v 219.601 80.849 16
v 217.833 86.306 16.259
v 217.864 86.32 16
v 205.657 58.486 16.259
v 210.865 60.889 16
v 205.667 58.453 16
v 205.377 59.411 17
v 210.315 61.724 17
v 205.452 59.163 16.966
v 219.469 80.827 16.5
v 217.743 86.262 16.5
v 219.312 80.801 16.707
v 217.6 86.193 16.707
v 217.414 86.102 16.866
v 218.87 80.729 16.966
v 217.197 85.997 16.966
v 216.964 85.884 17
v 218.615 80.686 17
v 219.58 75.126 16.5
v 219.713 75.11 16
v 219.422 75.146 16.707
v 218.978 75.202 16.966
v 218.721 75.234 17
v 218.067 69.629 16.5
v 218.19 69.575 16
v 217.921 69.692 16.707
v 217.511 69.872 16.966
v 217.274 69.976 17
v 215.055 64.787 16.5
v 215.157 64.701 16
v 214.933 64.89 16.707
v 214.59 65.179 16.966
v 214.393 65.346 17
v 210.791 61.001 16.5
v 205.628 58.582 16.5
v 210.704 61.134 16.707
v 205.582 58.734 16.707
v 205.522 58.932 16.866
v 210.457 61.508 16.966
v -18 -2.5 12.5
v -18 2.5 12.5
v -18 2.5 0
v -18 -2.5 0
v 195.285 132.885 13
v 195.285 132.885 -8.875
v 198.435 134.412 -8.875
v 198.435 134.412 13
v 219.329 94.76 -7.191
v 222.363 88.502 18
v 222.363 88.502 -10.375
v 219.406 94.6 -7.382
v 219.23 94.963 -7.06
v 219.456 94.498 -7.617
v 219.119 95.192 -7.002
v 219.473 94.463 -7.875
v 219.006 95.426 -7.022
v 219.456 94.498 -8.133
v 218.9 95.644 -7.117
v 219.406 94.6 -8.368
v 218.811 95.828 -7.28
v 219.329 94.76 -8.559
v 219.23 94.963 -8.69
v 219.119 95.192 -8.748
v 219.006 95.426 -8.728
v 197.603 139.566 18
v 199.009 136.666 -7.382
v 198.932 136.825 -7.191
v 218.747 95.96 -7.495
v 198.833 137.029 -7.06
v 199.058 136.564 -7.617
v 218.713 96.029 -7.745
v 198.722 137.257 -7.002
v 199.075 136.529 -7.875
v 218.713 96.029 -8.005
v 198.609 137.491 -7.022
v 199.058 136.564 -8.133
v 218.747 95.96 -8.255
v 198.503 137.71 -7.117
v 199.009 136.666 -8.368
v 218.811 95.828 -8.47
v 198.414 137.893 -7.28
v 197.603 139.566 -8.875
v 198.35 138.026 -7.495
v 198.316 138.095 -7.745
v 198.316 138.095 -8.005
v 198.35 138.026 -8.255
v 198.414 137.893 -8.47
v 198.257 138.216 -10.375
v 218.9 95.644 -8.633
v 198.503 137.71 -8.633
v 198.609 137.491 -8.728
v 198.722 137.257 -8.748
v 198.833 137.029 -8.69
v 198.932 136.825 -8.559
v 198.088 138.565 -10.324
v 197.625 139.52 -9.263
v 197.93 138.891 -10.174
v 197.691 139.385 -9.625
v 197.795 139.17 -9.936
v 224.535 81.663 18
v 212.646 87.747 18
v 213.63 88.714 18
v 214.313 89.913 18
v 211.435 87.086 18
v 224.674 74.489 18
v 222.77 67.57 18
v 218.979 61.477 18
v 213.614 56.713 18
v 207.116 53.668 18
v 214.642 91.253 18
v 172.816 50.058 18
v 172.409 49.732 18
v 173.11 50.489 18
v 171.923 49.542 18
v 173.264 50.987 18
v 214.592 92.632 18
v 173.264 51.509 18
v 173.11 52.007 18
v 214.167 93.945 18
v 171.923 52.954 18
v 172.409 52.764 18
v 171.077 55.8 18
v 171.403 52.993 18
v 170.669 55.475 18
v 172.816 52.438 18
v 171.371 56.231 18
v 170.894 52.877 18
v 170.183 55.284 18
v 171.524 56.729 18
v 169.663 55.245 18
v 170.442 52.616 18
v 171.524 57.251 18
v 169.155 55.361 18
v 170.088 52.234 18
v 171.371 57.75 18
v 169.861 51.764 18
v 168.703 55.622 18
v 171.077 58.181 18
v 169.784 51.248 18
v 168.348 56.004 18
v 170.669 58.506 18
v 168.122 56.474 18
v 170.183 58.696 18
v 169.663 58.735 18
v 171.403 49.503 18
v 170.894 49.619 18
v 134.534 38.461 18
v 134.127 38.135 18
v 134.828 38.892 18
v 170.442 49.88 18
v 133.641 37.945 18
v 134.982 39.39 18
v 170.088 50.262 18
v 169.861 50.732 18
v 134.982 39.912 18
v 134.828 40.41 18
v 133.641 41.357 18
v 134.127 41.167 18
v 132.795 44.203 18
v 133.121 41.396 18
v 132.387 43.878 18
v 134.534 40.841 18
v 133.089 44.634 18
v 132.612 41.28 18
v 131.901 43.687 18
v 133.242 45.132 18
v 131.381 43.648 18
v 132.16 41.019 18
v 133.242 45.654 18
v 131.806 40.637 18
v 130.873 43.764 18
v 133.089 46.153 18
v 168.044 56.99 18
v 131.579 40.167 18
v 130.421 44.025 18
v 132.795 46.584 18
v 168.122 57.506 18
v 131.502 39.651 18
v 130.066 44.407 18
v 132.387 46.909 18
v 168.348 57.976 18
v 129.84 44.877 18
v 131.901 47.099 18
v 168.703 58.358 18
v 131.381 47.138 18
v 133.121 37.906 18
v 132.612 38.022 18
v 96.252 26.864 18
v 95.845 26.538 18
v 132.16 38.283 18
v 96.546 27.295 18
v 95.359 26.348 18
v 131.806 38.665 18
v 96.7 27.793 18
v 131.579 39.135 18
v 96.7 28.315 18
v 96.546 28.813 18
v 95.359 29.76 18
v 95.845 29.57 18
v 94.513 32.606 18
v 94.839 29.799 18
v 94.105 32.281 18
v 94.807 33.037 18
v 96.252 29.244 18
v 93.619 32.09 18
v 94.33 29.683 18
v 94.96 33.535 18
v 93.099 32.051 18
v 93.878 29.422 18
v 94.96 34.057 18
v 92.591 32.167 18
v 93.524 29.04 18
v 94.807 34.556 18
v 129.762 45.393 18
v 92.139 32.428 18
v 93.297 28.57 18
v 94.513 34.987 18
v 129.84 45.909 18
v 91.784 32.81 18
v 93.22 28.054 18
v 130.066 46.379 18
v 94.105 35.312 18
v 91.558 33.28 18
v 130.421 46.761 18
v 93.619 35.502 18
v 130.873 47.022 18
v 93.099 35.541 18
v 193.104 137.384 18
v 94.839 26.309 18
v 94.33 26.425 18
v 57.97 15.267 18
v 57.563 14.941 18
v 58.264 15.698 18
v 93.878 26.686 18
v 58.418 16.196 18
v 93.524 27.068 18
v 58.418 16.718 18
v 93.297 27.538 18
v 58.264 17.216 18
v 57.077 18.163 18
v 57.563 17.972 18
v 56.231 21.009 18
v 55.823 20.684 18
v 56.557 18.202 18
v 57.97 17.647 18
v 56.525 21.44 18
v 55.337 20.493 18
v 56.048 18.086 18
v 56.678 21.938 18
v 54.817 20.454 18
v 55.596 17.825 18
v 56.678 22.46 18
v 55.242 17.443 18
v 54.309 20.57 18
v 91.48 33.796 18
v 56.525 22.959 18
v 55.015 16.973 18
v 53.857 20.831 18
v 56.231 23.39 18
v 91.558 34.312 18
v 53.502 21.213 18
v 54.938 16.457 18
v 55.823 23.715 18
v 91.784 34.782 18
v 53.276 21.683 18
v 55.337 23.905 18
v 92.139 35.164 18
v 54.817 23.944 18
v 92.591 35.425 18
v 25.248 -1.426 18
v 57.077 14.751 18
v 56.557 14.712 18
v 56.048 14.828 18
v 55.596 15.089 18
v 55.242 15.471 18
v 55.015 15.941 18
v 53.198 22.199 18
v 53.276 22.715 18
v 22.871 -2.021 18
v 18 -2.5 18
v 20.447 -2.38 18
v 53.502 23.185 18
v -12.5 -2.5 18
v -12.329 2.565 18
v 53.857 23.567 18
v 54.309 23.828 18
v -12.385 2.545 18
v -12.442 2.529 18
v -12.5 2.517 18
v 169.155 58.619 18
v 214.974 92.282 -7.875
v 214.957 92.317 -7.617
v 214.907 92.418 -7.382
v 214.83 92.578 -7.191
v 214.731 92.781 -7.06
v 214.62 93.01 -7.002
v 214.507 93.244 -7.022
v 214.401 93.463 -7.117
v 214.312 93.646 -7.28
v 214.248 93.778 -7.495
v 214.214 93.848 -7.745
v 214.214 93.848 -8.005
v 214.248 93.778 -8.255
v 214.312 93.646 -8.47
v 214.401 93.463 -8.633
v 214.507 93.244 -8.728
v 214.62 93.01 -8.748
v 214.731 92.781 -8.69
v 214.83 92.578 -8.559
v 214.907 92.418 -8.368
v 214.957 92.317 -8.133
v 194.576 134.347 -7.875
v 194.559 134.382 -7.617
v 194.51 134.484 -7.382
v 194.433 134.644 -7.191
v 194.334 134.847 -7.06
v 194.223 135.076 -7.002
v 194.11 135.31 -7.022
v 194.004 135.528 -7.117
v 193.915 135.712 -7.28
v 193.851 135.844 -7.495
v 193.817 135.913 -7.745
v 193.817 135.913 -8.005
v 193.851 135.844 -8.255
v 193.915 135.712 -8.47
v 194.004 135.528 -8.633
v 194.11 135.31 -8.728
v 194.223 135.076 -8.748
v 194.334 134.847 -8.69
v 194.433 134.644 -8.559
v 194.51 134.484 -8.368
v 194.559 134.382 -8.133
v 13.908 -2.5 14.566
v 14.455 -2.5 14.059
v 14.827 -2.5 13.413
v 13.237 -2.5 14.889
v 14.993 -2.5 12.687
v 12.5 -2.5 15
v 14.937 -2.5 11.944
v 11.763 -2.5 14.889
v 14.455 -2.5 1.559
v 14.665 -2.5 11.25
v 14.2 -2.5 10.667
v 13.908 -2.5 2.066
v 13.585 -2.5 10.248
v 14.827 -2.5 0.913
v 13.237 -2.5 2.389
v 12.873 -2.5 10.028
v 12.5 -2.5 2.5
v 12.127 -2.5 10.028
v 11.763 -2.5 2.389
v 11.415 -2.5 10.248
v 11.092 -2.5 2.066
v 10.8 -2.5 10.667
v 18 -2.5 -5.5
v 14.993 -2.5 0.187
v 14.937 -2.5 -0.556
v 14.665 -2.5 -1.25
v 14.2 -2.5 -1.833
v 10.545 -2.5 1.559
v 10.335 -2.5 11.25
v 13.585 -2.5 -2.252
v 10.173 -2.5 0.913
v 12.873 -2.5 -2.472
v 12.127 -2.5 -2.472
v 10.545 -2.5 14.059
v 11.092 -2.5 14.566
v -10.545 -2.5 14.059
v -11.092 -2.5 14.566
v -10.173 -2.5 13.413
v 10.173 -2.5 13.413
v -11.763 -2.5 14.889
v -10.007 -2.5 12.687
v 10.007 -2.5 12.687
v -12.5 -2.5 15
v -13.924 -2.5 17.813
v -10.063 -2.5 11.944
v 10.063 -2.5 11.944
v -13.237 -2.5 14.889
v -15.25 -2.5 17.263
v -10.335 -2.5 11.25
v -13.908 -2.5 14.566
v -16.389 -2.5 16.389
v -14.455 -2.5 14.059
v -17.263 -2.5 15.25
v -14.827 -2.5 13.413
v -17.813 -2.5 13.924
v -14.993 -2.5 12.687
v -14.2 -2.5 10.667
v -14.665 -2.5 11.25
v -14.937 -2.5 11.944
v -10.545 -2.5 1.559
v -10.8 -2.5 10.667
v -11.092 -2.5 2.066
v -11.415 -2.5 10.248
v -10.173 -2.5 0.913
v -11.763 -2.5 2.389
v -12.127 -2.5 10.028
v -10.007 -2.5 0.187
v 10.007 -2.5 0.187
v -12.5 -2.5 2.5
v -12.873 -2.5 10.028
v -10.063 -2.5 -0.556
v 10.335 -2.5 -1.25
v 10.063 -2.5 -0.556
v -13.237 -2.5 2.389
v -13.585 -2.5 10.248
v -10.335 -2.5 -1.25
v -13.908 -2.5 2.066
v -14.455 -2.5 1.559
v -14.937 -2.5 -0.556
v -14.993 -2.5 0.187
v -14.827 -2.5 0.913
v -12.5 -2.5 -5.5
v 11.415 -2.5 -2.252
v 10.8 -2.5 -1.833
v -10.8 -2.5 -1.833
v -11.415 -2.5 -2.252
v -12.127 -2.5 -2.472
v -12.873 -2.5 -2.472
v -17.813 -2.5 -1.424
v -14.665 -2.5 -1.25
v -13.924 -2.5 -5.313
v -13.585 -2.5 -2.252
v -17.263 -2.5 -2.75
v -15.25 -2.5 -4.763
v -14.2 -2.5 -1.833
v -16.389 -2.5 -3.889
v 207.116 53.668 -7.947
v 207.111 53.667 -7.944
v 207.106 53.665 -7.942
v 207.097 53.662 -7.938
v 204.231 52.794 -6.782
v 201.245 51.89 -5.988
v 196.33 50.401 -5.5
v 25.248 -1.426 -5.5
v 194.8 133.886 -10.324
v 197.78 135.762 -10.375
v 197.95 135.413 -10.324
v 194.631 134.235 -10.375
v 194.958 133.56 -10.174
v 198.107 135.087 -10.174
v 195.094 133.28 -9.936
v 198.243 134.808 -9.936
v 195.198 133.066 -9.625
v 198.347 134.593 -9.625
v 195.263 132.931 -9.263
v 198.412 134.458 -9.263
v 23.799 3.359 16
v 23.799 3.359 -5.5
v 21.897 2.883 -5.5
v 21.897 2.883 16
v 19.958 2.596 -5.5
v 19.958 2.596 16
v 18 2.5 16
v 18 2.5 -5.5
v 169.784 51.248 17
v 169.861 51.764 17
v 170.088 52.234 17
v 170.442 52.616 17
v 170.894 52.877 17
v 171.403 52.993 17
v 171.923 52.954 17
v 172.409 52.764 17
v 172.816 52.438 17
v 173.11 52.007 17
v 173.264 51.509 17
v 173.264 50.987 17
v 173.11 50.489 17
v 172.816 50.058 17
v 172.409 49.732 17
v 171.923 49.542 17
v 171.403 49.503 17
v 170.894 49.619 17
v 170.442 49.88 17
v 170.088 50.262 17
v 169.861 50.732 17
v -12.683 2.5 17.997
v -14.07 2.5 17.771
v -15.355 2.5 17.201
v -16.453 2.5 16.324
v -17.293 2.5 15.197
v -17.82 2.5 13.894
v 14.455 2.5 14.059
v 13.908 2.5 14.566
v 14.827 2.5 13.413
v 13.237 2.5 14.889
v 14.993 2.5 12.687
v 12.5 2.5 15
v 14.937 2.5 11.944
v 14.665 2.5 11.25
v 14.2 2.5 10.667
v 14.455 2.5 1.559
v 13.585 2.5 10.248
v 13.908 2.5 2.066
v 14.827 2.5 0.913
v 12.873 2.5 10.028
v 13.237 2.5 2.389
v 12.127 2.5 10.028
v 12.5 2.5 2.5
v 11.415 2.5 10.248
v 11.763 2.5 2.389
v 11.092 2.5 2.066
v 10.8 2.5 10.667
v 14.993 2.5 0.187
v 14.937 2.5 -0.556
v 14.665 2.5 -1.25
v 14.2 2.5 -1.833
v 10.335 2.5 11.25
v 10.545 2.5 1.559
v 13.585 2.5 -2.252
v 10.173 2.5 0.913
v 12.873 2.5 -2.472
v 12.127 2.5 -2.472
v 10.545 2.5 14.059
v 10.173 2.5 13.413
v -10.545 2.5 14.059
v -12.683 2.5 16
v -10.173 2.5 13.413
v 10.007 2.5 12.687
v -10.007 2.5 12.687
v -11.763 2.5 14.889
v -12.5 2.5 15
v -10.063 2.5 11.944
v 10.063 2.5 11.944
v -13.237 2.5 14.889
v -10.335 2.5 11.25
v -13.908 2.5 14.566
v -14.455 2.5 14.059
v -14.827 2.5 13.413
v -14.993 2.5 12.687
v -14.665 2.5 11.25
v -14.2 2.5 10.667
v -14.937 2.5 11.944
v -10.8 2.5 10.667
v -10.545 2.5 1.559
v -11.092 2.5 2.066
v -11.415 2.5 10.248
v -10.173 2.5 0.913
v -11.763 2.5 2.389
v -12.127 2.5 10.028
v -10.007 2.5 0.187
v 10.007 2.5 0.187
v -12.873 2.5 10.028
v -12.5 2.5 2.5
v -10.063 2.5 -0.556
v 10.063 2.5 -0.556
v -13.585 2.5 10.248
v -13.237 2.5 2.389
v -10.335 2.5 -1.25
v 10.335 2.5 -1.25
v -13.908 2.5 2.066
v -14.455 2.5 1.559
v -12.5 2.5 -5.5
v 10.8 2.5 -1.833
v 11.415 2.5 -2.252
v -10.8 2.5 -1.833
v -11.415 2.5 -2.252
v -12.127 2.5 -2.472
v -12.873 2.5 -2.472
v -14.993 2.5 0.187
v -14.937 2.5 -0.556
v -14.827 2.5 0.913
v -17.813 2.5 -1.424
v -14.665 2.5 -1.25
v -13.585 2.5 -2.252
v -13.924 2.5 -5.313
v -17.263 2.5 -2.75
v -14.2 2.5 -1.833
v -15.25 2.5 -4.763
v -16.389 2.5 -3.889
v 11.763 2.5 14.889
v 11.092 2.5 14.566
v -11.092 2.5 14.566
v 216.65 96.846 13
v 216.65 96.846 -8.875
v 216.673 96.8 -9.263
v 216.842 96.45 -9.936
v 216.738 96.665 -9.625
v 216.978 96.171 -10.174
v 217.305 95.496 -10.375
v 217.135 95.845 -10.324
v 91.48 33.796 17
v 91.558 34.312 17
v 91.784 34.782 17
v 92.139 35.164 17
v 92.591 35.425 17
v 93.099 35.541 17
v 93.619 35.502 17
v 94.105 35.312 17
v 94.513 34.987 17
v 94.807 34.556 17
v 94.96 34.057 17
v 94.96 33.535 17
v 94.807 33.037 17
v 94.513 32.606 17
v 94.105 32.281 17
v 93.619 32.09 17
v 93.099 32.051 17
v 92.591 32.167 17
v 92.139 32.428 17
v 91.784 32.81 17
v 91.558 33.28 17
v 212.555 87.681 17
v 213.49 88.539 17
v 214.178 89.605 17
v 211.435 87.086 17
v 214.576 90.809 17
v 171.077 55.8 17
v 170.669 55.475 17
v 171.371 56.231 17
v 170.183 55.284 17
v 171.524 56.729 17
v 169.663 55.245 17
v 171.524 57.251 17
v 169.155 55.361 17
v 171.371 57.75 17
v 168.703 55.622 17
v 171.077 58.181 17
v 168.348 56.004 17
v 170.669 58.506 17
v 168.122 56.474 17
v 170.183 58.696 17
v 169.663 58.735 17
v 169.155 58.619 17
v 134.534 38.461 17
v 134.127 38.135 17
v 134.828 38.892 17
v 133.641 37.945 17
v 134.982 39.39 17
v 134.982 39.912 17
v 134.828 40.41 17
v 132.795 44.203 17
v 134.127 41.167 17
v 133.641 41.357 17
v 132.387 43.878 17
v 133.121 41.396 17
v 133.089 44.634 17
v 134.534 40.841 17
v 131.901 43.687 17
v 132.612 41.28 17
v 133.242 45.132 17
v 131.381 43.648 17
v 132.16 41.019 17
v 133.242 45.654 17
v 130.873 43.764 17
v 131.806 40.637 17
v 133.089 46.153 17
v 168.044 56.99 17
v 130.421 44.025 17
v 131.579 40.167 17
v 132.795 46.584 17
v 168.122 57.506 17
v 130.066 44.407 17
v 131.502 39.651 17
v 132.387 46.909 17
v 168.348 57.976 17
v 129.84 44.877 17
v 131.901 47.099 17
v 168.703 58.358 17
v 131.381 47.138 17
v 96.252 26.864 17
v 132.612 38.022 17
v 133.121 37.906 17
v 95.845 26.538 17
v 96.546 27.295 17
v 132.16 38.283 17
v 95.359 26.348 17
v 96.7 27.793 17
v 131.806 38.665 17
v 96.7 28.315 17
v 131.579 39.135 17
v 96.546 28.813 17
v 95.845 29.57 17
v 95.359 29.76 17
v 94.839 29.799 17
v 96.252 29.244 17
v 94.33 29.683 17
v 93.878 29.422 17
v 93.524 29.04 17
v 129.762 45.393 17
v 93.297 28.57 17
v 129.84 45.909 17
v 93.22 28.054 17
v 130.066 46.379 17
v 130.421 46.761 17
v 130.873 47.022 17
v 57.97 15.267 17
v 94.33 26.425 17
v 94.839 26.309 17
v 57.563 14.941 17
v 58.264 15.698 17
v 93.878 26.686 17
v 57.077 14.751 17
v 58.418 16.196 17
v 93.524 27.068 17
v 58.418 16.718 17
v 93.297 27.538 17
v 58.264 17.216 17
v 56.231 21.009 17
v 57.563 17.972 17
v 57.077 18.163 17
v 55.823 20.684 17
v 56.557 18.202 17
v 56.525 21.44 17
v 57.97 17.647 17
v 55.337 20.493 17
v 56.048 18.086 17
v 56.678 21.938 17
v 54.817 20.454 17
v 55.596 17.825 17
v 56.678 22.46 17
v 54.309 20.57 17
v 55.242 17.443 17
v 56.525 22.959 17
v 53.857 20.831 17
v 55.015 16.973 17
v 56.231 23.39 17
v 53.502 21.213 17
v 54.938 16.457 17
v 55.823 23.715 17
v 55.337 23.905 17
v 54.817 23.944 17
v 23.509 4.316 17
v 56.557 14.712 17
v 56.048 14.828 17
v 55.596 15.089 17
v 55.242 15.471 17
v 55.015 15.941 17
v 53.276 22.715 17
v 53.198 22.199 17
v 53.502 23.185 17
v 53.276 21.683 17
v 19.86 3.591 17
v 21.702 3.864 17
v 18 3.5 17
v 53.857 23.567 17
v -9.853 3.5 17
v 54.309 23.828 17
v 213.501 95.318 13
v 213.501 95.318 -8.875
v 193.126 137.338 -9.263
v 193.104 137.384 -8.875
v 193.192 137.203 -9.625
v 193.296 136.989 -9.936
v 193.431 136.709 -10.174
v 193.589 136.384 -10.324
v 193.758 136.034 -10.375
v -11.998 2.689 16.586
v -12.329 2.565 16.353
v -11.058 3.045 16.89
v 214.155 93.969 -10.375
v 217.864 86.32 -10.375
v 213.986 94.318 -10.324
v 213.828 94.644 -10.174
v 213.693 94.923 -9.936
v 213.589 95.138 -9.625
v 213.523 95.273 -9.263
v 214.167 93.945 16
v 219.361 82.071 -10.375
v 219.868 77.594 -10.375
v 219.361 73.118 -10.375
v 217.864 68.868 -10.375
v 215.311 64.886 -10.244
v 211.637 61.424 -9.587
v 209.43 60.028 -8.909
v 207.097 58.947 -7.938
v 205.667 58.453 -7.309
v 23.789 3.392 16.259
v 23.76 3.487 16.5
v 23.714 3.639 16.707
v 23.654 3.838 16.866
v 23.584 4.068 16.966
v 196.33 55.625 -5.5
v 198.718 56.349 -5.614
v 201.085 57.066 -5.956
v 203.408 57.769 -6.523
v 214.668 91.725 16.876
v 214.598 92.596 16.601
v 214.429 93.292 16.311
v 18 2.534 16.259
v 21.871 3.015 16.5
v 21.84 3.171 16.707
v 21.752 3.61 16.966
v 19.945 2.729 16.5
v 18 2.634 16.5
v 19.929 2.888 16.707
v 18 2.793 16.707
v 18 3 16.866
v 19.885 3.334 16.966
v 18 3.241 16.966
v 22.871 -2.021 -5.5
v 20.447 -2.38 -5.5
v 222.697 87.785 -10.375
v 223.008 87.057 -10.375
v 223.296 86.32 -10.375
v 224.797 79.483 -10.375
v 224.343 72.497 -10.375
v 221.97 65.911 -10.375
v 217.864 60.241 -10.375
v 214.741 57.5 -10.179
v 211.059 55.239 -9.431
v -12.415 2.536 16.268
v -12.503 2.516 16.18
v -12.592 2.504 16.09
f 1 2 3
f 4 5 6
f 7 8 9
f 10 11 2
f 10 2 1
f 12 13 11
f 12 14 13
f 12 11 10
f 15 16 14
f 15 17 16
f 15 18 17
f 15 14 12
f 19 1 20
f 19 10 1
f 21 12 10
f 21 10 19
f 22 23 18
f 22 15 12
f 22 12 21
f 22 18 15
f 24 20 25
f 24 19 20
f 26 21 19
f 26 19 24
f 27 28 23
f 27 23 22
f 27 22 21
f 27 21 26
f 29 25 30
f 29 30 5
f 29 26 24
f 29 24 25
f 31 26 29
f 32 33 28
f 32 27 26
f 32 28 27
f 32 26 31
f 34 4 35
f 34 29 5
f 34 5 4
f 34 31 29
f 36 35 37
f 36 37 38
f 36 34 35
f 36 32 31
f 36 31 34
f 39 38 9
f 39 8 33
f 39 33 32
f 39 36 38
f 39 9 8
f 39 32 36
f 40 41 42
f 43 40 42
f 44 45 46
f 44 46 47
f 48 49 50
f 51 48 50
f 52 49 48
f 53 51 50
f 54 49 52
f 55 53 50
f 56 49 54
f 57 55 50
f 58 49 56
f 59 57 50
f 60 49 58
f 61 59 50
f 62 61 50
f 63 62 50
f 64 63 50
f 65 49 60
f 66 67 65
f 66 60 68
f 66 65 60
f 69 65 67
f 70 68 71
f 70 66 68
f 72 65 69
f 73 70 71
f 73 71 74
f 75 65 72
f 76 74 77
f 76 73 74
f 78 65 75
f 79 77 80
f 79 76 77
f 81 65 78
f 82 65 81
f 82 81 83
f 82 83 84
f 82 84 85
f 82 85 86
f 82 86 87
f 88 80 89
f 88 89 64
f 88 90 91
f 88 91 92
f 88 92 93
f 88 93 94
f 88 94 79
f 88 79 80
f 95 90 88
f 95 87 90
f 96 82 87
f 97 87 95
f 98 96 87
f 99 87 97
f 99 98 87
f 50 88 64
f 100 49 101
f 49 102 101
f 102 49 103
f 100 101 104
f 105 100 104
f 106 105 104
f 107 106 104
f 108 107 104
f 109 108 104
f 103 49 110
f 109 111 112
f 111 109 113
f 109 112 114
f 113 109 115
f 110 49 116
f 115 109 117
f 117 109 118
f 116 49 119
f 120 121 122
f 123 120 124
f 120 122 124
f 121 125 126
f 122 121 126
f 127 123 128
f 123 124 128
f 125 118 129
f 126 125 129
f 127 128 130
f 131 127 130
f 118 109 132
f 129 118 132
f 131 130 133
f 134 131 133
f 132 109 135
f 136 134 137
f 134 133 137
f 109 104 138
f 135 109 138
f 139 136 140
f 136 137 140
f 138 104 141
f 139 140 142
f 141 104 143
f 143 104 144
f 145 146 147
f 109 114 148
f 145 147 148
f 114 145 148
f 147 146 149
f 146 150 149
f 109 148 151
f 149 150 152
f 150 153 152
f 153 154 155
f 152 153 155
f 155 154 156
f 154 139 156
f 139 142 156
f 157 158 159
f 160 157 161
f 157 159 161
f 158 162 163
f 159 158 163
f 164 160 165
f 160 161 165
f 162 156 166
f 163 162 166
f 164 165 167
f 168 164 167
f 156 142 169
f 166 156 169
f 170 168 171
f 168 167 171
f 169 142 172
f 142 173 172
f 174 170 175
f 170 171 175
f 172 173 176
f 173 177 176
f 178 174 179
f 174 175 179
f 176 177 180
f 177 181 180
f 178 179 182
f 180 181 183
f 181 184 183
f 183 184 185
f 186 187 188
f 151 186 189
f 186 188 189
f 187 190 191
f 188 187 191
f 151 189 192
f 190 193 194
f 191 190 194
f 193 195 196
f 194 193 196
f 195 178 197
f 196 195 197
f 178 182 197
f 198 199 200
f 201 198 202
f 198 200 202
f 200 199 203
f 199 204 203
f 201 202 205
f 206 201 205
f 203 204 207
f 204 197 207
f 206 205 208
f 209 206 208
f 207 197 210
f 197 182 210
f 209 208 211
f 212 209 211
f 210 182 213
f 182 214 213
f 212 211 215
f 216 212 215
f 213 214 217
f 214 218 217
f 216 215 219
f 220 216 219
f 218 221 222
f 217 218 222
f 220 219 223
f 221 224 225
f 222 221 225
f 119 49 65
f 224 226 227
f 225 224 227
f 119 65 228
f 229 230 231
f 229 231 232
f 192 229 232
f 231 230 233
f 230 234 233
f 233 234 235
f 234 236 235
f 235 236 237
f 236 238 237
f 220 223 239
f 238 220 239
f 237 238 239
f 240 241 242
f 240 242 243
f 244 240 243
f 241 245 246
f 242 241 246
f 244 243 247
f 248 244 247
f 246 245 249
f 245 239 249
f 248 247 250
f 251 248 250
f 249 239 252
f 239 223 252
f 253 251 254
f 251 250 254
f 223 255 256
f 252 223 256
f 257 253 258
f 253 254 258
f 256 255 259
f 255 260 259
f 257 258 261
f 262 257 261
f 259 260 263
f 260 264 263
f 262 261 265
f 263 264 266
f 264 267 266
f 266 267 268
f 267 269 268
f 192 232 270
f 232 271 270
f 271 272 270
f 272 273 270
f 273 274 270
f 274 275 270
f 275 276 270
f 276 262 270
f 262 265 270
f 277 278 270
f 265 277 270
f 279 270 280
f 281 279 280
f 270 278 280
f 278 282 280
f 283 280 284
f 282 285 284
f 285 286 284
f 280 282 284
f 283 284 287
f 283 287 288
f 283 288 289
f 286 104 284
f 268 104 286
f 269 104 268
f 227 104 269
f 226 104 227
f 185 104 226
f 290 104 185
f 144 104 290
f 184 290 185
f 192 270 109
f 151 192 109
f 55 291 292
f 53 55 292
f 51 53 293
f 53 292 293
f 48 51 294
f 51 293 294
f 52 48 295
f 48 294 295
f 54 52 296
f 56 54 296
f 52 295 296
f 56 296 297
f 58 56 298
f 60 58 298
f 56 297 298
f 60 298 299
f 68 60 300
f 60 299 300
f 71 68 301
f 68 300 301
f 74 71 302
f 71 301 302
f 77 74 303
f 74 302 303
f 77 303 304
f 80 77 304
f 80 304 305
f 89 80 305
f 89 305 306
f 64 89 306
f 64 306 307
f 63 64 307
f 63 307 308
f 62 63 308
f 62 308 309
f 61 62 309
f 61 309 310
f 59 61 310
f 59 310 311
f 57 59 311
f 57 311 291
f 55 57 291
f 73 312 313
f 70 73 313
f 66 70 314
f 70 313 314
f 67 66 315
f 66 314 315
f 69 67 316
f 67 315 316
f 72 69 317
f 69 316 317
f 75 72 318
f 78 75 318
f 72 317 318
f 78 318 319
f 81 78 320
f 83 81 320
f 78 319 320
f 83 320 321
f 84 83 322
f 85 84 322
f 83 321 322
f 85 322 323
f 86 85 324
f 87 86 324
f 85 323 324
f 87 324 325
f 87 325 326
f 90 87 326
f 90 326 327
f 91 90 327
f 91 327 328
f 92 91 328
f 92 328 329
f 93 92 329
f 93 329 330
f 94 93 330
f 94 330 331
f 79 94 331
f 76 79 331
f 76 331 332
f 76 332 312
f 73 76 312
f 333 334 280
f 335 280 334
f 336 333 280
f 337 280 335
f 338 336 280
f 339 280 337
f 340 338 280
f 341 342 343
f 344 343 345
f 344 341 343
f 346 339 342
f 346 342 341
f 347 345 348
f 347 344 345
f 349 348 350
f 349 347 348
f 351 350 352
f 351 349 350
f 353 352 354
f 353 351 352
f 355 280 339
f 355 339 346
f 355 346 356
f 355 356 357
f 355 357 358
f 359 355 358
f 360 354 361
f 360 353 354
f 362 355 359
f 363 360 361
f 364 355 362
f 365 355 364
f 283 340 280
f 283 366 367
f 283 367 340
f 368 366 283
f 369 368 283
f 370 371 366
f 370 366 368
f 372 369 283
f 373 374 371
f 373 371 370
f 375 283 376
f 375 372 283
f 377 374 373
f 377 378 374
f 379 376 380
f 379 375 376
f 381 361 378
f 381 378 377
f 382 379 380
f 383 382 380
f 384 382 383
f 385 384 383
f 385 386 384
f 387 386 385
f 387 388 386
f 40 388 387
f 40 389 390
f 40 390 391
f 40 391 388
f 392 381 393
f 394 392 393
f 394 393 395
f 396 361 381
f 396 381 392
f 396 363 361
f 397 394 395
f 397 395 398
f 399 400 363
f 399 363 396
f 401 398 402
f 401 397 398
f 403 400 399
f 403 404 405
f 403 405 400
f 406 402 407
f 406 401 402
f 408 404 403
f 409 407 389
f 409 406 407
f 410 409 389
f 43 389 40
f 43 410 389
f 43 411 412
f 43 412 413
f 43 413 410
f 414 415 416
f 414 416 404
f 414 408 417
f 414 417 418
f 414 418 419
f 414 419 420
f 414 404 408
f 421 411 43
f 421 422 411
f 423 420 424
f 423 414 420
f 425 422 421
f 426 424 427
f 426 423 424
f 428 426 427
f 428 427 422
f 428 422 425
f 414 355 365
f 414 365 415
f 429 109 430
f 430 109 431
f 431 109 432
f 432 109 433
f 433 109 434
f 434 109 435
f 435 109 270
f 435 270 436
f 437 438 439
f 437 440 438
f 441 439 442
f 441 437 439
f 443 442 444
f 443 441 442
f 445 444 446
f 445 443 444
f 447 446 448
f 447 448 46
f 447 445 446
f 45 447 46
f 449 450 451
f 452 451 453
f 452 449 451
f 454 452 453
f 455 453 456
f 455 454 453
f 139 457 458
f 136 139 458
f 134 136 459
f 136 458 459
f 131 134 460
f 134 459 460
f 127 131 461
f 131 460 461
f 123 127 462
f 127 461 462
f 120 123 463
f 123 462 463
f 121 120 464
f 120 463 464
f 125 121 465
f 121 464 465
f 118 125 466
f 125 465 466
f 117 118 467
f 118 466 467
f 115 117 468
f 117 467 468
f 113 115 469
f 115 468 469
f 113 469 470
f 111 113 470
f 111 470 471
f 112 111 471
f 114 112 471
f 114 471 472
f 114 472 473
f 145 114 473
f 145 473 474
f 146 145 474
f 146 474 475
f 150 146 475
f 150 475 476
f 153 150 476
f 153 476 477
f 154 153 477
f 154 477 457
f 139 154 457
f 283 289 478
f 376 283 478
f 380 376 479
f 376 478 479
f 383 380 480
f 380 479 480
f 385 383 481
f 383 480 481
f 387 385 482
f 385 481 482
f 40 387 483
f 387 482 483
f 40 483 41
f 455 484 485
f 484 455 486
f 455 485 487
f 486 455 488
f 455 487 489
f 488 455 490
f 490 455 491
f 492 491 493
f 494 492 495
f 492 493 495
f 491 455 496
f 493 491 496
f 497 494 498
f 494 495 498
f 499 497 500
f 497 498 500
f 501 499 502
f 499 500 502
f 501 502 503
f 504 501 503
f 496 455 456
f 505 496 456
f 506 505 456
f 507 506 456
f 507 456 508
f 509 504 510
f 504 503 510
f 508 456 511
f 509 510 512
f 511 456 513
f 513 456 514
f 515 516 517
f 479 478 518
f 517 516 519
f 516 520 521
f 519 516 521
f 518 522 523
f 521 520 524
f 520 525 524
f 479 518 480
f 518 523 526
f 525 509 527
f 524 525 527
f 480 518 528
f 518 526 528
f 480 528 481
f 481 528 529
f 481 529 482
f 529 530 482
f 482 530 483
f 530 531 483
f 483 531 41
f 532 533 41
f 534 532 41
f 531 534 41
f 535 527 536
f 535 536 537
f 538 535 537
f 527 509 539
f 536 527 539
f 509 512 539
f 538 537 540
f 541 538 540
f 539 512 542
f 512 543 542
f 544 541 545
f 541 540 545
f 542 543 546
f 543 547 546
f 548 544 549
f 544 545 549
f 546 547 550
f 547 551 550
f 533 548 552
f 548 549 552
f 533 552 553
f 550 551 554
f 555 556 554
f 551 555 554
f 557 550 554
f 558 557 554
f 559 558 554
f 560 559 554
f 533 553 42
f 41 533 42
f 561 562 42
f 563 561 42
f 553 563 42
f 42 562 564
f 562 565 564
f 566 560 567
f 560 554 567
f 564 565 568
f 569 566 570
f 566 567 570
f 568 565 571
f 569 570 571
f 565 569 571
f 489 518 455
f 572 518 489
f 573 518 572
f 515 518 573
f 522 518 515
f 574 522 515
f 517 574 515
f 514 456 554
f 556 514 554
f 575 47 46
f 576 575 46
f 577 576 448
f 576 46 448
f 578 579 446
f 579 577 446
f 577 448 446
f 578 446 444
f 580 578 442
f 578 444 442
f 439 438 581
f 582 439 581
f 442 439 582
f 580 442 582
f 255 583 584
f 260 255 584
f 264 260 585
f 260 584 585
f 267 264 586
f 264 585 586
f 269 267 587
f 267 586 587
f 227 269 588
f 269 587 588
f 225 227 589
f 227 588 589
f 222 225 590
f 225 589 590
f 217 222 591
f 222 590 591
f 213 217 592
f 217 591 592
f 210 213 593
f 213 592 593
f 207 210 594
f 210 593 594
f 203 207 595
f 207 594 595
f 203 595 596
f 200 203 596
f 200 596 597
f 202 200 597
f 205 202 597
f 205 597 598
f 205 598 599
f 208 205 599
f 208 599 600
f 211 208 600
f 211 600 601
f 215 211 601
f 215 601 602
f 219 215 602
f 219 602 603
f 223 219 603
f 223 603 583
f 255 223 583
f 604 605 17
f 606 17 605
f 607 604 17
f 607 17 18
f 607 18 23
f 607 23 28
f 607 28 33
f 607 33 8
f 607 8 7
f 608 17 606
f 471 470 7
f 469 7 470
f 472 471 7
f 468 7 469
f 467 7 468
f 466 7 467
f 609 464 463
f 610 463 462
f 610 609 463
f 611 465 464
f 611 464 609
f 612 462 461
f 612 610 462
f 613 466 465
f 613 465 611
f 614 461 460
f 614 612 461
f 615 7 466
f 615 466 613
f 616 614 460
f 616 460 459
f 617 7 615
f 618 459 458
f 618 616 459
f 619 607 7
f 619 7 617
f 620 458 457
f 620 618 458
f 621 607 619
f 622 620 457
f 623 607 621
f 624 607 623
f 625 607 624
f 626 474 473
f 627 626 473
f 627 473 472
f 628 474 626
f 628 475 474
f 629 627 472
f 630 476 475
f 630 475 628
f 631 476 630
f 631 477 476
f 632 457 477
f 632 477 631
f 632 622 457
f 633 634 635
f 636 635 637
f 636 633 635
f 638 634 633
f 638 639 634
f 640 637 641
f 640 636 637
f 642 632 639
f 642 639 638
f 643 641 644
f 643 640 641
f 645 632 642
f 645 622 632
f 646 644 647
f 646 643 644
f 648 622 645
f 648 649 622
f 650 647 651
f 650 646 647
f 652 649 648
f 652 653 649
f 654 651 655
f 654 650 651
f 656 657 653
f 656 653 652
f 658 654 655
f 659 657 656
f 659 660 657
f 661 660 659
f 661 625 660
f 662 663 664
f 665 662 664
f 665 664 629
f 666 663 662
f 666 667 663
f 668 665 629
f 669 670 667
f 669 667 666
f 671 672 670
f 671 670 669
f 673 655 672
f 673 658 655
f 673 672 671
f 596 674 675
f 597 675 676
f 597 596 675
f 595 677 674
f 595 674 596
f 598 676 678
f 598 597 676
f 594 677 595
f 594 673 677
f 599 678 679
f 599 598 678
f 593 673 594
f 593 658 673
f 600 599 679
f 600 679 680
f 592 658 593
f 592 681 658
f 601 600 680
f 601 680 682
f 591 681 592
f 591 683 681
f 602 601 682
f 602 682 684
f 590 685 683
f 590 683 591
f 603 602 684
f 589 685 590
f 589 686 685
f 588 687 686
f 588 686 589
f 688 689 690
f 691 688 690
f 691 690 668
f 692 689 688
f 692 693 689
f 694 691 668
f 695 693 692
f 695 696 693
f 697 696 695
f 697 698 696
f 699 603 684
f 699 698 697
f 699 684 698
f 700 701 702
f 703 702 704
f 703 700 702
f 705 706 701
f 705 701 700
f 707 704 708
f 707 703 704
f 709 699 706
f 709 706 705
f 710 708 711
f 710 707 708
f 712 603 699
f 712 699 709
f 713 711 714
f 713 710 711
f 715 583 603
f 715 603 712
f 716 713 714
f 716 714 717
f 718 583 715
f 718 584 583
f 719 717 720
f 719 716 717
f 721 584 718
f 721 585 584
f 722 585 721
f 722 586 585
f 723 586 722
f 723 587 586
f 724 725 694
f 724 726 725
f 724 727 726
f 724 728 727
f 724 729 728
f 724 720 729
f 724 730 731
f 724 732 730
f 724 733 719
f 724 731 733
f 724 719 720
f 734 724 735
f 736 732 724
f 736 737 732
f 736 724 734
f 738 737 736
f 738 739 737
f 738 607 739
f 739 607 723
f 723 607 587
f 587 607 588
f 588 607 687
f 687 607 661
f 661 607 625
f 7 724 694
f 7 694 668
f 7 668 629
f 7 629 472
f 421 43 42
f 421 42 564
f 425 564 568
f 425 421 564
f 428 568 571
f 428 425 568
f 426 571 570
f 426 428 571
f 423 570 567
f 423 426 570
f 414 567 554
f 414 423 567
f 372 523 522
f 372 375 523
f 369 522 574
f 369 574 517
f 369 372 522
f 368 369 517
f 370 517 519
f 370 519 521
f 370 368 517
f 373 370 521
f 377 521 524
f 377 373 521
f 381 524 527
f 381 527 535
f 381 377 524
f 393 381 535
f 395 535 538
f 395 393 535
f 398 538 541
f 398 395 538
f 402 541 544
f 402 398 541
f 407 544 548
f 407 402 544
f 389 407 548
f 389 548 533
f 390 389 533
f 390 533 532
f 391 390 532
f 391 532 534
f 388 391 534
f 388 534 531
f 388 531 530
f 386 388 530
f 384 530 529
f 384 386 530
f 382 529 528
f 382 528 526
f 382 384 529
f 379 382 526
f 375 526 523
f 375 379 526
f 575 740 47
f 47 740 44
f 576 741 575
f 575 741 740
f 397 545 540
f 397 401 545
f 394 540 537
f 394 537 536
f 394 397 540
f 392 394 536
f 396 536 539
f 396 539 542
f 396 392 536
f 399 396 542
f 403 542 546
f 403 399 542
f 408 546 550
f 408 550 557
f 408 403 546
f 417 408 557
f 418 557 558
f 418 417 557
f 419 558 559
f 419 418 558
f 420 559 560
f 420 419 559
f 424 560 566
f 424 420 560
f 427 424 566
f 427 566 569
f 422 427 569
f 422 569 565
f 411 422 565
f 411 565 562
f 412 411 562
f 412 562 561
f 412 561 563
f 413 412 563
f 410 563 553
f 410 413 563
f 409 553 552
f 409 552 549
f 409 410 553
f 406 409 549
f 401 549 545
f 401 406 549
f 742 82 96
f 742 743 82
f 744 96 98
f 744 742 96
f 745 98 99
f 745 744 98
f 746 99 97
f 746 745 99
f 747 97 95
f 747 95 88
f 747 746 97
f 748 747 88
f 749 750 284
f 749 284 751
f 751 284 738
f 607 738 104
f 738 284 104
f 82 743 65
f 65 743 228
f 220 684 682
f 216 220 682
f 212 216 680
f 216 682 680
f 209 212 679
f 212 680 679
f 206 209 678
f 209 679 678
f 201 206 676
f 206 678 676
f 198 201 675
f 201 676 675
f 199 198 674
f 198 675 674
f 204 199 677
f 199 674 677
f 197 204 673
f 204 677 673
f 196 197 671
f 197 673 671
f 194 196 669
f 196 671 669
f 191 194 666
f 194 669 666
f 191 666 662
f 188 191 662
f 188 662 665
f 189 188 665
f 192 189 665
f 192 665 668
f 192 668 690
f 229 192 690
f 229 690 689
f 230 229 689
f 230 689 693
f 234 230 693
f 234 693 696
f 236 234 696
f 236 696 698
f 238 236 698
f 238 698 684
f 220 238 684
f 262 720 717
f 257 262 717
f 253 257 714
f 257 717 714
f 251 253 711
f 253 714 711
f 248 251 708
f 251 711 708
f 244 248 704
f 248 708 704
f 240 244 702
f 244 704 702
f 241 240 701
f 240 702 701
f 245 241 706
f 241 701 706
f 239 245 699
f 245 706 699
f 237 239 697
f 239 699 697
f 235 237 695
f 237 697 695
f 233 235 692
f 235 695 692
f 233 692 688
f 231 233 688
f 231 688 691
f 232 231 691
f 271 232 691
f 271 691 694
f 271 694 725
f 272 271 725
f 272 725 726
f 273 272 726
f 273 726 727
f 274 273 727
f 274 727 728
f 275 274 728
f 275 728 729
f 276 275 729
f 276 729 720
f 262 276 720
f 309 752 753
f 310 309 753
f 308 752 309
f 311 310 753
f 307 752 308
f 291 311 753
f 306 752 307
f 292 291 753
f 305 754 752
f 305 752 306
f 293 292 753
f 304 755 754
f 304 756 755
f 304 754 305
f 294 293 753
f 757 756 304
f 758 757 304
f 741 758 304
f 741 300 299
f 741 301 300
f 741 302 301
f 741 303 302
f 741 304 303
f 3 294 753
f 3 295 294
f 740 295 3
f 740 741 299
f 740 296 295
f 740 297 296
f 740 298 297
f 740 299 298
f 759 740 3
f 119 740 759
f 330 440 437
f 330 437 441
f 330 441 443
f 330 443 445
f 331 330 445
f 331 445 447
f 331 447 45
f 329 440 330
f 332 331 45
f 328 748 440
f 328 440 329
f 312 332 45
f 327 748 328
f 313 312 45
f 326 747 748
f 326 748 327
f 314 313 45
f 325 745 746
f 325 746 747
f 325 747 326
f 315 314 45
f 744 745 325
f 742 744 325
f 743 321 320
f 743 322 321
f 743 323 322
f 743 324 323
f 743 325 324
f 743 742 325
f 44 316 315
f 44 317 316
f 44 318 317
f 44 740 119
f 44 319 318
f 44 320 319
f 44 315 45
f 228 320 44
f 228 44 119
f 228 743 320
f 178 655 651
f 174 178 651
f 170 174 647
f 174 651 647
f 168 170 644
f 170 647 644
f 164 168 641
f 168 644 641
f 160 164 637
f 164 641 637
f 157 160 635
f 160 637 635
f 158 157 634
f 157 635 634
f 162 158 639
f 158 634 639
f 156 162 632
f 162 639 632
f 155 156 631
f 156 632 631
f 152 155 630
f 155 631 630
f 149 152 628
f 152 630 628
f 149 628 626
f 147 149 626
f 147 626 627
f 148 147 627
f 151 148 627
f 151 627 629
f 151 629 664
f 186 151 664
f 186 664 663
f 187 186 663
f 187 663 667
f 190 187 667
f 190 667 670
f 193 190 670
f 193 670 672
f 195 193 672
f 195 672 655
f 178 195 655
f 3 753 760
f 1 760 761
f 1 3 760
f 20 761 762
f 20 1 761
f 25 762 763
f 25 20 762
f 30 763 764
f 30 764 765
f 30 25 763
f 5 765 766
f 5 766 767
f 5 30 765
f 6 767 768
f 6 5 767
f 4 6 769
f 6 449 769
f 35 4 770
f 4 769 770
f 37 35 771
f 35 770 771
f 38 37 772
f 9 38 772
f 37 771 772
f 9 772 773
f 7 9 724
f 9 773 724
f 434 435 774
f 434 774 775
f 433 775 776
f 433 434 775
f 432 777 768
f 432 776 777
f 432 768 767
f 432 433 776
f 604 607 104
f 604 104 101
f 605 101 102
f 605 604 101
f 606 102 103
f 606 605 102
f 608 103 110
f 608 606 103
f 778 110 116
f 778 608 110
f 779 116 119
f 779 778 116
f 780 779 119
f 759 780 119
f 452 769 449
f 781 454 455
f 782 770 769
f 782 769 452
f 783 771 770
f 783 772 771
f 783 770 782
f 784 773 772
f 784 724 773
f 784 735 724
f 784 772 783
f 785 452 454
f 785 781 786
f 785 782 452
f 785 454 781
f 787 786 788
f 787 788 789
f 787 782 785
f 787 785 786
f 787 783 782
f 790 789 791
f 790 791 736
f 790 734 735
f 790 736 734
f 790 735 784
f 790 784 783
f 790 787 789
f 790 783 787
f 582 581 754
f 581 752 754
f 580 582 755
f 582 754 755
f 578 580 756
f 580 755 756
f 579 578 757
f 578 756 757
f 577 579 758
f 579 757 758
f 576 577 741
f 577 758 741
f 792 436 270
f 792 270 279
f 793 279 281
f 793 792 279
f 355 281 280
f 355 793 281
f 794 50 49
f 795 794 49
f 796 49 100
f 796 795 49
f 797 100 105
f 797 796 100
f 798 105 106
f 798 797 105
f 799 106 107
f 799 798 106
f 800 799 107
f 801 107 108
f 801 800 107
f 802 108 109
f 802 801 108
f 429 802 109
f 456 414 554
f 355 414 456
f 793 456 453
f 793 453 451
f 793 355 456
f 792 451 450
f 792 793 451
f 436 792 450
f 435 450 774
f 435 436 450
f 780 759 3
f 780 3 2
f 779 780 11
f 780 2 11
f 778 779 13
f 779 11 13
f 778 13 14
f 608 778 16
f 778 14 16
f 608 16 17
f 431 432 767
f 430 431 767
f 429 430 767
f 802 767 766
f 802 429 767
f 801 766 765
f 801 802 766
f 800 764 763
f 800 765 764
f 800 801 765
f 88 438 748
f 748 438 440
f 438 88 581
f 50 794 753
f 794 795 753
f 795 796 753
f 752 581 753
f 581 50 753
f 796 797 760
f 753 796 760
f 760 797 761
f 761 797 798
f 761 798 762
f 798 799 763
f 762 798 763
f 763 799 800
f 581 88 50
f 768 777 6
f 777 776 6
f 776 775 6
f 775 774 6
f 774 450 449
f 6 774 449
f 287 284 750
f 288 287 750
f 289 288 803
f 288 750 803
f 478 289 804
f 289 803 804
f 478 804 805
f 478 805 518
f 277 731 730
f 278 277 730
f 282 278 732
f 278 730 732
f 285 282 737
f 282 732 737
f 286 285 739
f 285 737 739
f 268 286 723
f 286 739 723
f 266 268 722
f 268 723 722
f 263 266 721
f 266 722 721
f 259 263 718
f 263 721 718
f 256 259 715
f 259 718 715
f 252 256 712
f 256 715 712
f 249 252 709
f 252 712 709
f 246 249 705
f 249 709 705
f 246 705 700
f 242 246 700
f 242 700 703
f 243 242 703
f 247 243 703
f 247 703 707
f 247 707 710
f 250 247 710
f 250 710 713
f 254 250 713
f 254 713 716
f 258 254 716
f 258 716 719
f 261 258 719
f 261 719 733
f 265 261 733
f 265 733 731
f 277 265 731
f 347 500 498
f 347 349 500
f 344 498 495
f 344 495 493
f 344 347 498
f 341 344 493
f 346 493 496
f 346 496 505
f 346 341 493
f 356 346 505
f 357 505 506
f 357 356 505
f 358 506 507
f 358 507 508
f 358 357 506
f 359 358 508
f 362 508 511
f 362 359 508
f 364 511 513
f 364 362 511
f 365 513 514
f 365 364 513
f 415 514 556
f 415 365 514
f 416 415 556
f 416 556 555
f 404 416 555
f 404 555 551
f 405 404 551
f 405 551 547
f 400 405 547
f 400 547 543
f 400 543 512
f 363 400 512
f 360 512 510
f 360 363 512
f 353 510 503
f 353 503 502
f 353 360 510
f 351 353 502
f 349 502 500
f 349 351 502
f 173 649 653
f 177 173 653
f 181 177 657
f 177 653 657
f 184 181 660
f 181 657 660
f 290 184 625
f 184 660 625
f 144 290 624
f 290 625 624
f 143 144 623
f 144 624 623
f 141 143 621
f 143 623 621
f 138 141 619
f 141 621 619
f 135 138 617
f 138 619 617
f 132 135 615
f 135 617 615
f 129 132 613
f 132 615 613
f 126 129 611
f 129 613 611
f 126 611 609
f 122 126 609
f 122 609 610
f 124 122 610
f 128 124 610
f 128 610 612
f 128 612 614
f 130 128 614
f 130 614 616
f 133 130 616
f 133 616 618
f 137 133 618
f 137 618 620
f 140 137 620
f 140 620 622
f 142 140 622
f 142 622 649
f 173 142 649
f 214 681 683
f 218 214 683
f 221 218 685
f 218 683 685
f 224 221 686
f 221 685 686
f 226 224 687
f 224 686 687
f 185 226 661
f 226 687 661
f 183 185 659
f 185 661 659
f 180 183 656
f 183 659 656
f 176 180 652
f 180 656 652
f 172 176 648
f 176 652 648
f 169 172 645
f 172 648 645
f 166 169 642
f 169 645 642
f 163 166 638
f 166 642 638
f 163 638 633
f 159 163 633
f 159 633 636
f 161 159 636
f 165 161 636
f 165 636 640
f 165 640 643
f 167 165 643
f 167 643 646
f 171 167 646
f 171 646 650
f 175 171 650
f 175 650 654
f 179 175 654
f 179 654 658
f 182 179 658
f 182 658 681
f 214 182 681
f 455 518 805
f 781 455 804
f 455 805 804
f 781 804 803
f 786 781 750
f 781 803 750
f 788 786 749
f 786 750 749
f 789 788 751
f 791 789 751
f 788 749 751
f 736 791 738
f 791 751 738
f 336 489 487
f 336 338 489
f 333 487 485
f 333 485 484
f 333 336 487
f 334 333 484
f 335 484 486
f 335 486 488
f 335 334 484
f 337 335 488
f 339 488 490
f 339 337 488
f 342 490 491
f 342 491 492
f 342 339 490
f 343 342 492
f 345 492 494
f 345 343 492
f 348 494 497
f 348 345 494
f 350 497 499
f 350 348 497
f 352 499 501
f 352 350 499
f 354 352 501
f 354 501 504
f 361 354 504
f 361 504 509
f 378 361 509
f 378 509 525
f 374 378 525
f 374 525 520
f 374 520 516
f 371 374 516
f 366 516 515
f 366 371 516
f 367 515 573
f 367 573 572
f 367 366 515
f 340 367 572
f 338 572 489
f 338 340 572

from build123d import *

# Parameters (mm, degrees)
SKETCH2_R            = 2.5000000000000004
SKETCH2_R_2          = 2.5000000000000018
BOSS_EXTRUDE1_DEPTH  = 2.5
SKETCH5_W            = 36
SKETCH5_H            = 5
SKETCH11_W           = 51.75
SKETCH11_H           = 51.75
SKETCH11_W_2         = 41.75000000000001
SKETCH11_H_2         = 41.75000000000001
BOSS_EXTRUDE2_DEPTH  = 5
SKETCH14_W           = 41.75000000000001
SKETCH14_H           = 41.75000000000003
BOSS_EXTRUDE3_DEPTH  = 1.5
FILLET1_R            = 8
SKETCH18_R           = 0.8750000000000002
CUT_EXTRUDE3_DEPTH   = 254.3041056928498
CUT_EXTRUDE4_START   = -26.0000001
CUT_EXTRUDE4_DEPTH   = 15.6250001
CUT_EXTRUDE4_START_2 = -2.5
CUT_EXTRUDE4_2_DEPTH = 88.820487138
CUT_EXTRUDE5_DEPTH   = 245.11833407729904
FILLET2_R            = 1.5
BOSS_EXTRUDE4_DEPTH  = 1
FILLET3_R            = 1
SKETCH22_R           = 1.7500000000000062
SKETCH22_R_2         = 1.750000000000084
CUT_EXTRUDE6_DEPTH   = 267.0706428279103
LPATTERN1_COUNT      = 4
LPATTERN1_PITCH      = 40
FILLET4_R            = 5


with BuildPart() as part:
    # Sketch2 → Boss-Extrude1 (new, symmetric)
    with BuildSketch(Plane(origin=(0, 0, 0), x_dir=(1, 0, 0), z_dir=(0, 1, 0))):
        with BuildLine():
            Line((-18.000000000000004, -12.5), (-18, 12.5))
            ThreePointArc((-18, 12.5), (-16.38908729652601, 16.38908729652601), (-12.5, 18.000000000000004))
            Line((-12.5, 18.000000000000004), (12.5, 17.999999999999996))
            Line((12.5, 17.999999999999996), (18.000000000000004, 17.999999999999996))
            Line((18.000000000000004, 17.999999999999996), (18.000000000000004, 12.5))
            Line((18.000000000000004, 12.5), (18.000000000000004, -12.5))
            Line((18.000000000000004, -12.5), (18.000000000000004, -18.000000000000004))
            Line((18.000000000000004, -18.000000000000004), (12.5, -18.000000000000004))
            Line((12.5, -18.000000000000004), (-12.5, -18.000000000000004))
            ThreePointArc((-12.5, -18.000000000000004), (-16.389087296526014, -16.389087296526014), (-18.000000000000004, -12.5))
        make_face()
        with Locations(Location((-12.5, 12.5, 0), (0, 0, 270))):
            Circle(SKETCH2_R, mode=Mode.SUBTRACT)
        with Locations(Location((12.5, 12.5, 0), (0, 0, 270))):
            Circle(SKETCH2_R_2, mode=Mode.SUBTRACT)
        with Locations(Location((12.5, -12.5, 0), (0, 0, 270))):
            Circle(SKETCH2_R_2, mode=Mode.SUBTRACT)
        with Locations(Location((-12.5, -12.5, 0), (0, 0, 270))):
            Circle(SKETCH2_R, mode=Mode.SUBTRACT)
        with Locations(Location((-12.5, 0, 0), (0, 0, 270))):
            Circle(SKETCH2_R, mode=Mode.SUBTRACT)
        with Locations(Location((12.5, 0, 0), (0, 0, 270))):
            Circle(SKETCH2_R, mode=Mode.SUBTRACT)
    extrude(amount=BOSS_EXTRUDE1_DEPTH, both=True)

    # Sweep2: sweep along a path in Sketch4
    with BuildLine(Plane.XY) as sweep2_path:
        Line((218.00000000000003, 97.5), (222.36301639377288, 88.50199533520518))
        ThreePointArc((222.36301639377288, 88.50199533520518), (222.77022201371398, 67.5700619217352), (207.11613369668214, 53.66822133117237))
        Line((207.11613369668214, 53.66822133117237), (25.24812896489628, -1.4262330196007162))
        ThreePointArc((25.24812896489628, -1.4262330196007162), (21.66361669051104, -2.2301013492668282), (18.000000000000004, -2.5))
    # Sketch5 → Sweep2 (sweep)
    with BuildSketch(Plane(origin=(18.000000000000004, 0, 0), x_dir=(0, 0, -1), z_dir=(1, 0, 0))):
        Rectangle(SKETCH5_W, SKETCH5_H)
    sweep(path=sweep2_path.line)

    # Sketch11 → Boss-Extrude2 (add)
    with BuildSketch(Plane(origin=(210.27969021067267, 101.96190931709863, 0), x_dir=(0, 0, 1), z_dir=(-0.8998004664794823, -0.43630163937728456, 0))):
        with Locations((-7.874999999999998, 13.491788097501477)):
            Rectangle(SKETCH11_W, SKETCH11_H)
        with Locations((-7.875000000000001, 13.491788097501482)):
            Rectangle(SKETCH11_W_2, SKETCH11_H_2, mode=Mode.SUBTRACT)
    extrude(amount=-BOSS_EXTRUDE2_DEPTH)

    # Sketch14 → Boss-Extrude3 (add)
    with BuildSketch(Plane(origin=(214.7786925430701, 104.14341751398507, 0), x_dir=(0, 0, -1), z_dir=(0.8998004664794823, 0.43630163937728456, 0))):
        with Locations((7.875000000000001, 13.491788097501479)):
            Rectangle(SKETCH14_W, SKETCH14_H)
    extrude(amount=-BOSS_EXTRUDE3_DEPTH)

    # Fillet1
    fillet1_edges = [part.edges().sort_by_distance(p)[0] for p in [
        (217.93200703068783, 91.91024356915939, -17.999999999999936),
    ]]
    fillet(fillet1_edges, radius=FILLET1_R)

    # Sketch18 → Cut-Extrude3 (cut, through all)
    with BuildSketch(Plane(origin=(210.27969021067267, 101.96190931709863, 0), x_dir=(0, 0, 1), z_dir=(-0.8998004664794823, -0.43630163937728456, 0))):
        with Locations(Location((-7.875000000000007, 36.86678809750149, 0), (0, 0, 270))):
            Circle(SKETCH18_R)
        with Locations(Location((-7.874999999999993, -9.883211902498495, 0), (0, 0, 270))):
            Circle(SKETCH18_R)
    extrude(amount=-CUT_EXTRUDE3_DEPTH, mode=Mode.SUBTRACT)

    # Cut-Extrude4: read off the stored shape, not the designer's step
    # Cut-Extrude4 outline → Cut-Extrude4 (cut)
    with BuildSketch(Plane.XY.offset(CUT_EXTRUDE4_START)):
        with BuildLine():
            ThreePointArc((207.116133697, 53.668221331), (222.268763255, 66.494633739), (223.295688181, 86.320487138))
            Line((223.295688181, 86.320487138), (217.864014061, 86.320487138))
            ThreePointArc((217.864014061, 86.320487138), (218.189778557, 69.574940408), (205.666507904, 58.453467935))
            Line((205.666507904, 58.453467935), (23.798503172, 3.359013584))
            ThreePointArc((23.798503172, 3.359013584), (20.930893352, 2.715918921), (18, 2.5))
            Line((18, 2.5), (-18, 2.5))
            Line((-18, 2.5), (-18, -2.5))
            Line((-18, -2.5), (18, -2.5))
            ThreePointArc((18, -2.5), (21.66361669, -2.230101349), (25.248128965, -1.42623302))
            Line((25.248128965, -1.42623302), (207.116133697, 53.668221331))
        make_face()
    extrude(amount=CUT_EXTRUDE4_DEPTH, mode=Mode.SUBTRACT)

    # Cut-Extrude4 2 outline → Cut-Extrude4 2 (cut)
    with BuildSketch(Plane(origin=(0, 0, 0), x_dir=(1, 0, 0), z_dir=(0, 1, 0)).offset(CUT_EXTRUDE4_START_2)):
        with BuildLine():
            ThreePointArc((-18, 0), (-16.389087297, 3.889087297), (-12.5, 5.5))
            Line((-12.5, 5.5), (196.329521381, 5.5))
            ThreePointArc((196.329521381, 5.5), (201.849371922, 6.116988496), (207.096767721, 7.9375))
            ThreePointArc((207.096767721, 7.9375), (212.34416352, 9.758011504), (217.864014061, 10.375))
            Line((217.864014061, 10.375), (13.816956719, 10.375))
            ThreePointArc((13.816956719, 10.375), (12.5, 10), (11.183043281, 10.375))
            Line((11.183043281, 10.375), (-11.183043281, 10.375))
            ThreePointArc((-11.183043281, 10.375), (-12.5, 10), (-13.816956719, 10.375))
            Line((-13.816956719, 10.375), (-18, 10.375))
            Line((-18, 10.375), (-18, 0))
        make_face()
    extrude(amount=CUT_EXTRUDE4_2_DEPTH, mode=Mode.SUBTRACT)

    # Sketch20 → Cut-Extrude5 (cut, through all)
    with BuildSketch(Plane.XZ.offset(-86.32048713831875)):
        Polygon((223.29568818087398, -10.374999999999993), (193.1038960267146, -10.374999999999996), (193.1038960267146, -33.75), (223.29568818087398, -33.74999999999999), align=None)
    extrude(amount=-CUT_EXTRUDE5_DEPTH, mode=Mode.SUBTRACT)

    # Fillet2
    fillet2_edges = [part.edges().sort_by_distance(p)[0] for p in [
        (215.07564848394176, 96.08201967202383, -10.374999999999993),
        (195.35339719291332, 138.4749177094726, -10.374999999999996),
        (196.86005503994014, 133.64868914754223, -10.374999999999996),
    ]]
    fillet(fillet2_edges, radius=FILLET2_R)

    # Sketch21 → Boss-Extrude4 (add)
    with BuildSketch(Plane.XY.offset(18.000000000000004)):
        with BuildLine():
            Line((-12.5, 2.5), (216.5551091432436, 89.01988853775721))
            Line((216.5551091432436, 89.01988853775721), (217.86401406137549, 86.32048713831875))
            ThreePointArc((217.86401406137549, 86.32048713831875), (218.18977855732837, 69.57494040754278), (205.6665079037029, 58.45346793509252))
            Line((205.6665079037029, 58.45346793509252), (23.79850317191702, 3.3590135843194235))
            ThreePointArc((23.79850317191702, 3.3590135843194235), (20.930893352408834, 2.715918920586539), (18.000000000000004, 2.5))
            Line((18.000000000000004, 2.5), (-12.5, 2.5))
        make_face()
    extrude(amount=-BOSS_EXTRUDE4_DEPTH)

    # Fillet3
    fillet3_edges = [part.edges().sort_by_distance(p)[0] for p in [
        (2.7500000000000018, 2.5, 17.000000000000004),
        (-12.5, 2.5, 17.500000000000004),
        (217.20956160230955, 87.67018783803798, 17.000000000000004),
        (218.18977855732837, 69.57494040754277, 17.000000000000004),
        (114.73250553780996, 30.906240759705973, 17.000000000000004),
        (20.93089335240883, 2.715918920586539, 17.000000000000004),
    ]]
    fillet(fillet3_edges, radius=FILLET3_R)

    # Sketch22 → Cut-Extrude6 (cut, through all)
    with BuildSketch(Plane(origin=(0, 0, 17), x_dir=(-1, 0, 0), z_dir=(0, 0, -1))):
        with Locations((-171.53351288563837, 51.24797304135555)):
            Circle(SKETCH22_R)
        with Locations((-169.79396193406333, 56.99026896605974)):
            Circle(SKETCH22_R_2)
    cut_extrude6 = extrude(amount=-CUT_EXTRUDE6_DEPTH, mode=Mode.SUBTRACT)

    # LPattern1: Cut-Extrude6 ×4
    with Locations(*[Vector(-0.9570493207840286, -0.28992515859585144, 0) * (i * LPATTERN1_PITCH) for i in range(1, LPATTERN1_COUNT)]):
        add(cut_extrude6, mode=Mode.SUBTRACT)

    # Fillet4
    fillet4_edges = [part.edges().sort_by_distance(p)[0] for p in [
        (216.55510914324364, 89.01988853775723, 17.000000000000007),
    ]]
    fillet(fillet4_edges, radius=FILLET4_R)


solid = part.part
